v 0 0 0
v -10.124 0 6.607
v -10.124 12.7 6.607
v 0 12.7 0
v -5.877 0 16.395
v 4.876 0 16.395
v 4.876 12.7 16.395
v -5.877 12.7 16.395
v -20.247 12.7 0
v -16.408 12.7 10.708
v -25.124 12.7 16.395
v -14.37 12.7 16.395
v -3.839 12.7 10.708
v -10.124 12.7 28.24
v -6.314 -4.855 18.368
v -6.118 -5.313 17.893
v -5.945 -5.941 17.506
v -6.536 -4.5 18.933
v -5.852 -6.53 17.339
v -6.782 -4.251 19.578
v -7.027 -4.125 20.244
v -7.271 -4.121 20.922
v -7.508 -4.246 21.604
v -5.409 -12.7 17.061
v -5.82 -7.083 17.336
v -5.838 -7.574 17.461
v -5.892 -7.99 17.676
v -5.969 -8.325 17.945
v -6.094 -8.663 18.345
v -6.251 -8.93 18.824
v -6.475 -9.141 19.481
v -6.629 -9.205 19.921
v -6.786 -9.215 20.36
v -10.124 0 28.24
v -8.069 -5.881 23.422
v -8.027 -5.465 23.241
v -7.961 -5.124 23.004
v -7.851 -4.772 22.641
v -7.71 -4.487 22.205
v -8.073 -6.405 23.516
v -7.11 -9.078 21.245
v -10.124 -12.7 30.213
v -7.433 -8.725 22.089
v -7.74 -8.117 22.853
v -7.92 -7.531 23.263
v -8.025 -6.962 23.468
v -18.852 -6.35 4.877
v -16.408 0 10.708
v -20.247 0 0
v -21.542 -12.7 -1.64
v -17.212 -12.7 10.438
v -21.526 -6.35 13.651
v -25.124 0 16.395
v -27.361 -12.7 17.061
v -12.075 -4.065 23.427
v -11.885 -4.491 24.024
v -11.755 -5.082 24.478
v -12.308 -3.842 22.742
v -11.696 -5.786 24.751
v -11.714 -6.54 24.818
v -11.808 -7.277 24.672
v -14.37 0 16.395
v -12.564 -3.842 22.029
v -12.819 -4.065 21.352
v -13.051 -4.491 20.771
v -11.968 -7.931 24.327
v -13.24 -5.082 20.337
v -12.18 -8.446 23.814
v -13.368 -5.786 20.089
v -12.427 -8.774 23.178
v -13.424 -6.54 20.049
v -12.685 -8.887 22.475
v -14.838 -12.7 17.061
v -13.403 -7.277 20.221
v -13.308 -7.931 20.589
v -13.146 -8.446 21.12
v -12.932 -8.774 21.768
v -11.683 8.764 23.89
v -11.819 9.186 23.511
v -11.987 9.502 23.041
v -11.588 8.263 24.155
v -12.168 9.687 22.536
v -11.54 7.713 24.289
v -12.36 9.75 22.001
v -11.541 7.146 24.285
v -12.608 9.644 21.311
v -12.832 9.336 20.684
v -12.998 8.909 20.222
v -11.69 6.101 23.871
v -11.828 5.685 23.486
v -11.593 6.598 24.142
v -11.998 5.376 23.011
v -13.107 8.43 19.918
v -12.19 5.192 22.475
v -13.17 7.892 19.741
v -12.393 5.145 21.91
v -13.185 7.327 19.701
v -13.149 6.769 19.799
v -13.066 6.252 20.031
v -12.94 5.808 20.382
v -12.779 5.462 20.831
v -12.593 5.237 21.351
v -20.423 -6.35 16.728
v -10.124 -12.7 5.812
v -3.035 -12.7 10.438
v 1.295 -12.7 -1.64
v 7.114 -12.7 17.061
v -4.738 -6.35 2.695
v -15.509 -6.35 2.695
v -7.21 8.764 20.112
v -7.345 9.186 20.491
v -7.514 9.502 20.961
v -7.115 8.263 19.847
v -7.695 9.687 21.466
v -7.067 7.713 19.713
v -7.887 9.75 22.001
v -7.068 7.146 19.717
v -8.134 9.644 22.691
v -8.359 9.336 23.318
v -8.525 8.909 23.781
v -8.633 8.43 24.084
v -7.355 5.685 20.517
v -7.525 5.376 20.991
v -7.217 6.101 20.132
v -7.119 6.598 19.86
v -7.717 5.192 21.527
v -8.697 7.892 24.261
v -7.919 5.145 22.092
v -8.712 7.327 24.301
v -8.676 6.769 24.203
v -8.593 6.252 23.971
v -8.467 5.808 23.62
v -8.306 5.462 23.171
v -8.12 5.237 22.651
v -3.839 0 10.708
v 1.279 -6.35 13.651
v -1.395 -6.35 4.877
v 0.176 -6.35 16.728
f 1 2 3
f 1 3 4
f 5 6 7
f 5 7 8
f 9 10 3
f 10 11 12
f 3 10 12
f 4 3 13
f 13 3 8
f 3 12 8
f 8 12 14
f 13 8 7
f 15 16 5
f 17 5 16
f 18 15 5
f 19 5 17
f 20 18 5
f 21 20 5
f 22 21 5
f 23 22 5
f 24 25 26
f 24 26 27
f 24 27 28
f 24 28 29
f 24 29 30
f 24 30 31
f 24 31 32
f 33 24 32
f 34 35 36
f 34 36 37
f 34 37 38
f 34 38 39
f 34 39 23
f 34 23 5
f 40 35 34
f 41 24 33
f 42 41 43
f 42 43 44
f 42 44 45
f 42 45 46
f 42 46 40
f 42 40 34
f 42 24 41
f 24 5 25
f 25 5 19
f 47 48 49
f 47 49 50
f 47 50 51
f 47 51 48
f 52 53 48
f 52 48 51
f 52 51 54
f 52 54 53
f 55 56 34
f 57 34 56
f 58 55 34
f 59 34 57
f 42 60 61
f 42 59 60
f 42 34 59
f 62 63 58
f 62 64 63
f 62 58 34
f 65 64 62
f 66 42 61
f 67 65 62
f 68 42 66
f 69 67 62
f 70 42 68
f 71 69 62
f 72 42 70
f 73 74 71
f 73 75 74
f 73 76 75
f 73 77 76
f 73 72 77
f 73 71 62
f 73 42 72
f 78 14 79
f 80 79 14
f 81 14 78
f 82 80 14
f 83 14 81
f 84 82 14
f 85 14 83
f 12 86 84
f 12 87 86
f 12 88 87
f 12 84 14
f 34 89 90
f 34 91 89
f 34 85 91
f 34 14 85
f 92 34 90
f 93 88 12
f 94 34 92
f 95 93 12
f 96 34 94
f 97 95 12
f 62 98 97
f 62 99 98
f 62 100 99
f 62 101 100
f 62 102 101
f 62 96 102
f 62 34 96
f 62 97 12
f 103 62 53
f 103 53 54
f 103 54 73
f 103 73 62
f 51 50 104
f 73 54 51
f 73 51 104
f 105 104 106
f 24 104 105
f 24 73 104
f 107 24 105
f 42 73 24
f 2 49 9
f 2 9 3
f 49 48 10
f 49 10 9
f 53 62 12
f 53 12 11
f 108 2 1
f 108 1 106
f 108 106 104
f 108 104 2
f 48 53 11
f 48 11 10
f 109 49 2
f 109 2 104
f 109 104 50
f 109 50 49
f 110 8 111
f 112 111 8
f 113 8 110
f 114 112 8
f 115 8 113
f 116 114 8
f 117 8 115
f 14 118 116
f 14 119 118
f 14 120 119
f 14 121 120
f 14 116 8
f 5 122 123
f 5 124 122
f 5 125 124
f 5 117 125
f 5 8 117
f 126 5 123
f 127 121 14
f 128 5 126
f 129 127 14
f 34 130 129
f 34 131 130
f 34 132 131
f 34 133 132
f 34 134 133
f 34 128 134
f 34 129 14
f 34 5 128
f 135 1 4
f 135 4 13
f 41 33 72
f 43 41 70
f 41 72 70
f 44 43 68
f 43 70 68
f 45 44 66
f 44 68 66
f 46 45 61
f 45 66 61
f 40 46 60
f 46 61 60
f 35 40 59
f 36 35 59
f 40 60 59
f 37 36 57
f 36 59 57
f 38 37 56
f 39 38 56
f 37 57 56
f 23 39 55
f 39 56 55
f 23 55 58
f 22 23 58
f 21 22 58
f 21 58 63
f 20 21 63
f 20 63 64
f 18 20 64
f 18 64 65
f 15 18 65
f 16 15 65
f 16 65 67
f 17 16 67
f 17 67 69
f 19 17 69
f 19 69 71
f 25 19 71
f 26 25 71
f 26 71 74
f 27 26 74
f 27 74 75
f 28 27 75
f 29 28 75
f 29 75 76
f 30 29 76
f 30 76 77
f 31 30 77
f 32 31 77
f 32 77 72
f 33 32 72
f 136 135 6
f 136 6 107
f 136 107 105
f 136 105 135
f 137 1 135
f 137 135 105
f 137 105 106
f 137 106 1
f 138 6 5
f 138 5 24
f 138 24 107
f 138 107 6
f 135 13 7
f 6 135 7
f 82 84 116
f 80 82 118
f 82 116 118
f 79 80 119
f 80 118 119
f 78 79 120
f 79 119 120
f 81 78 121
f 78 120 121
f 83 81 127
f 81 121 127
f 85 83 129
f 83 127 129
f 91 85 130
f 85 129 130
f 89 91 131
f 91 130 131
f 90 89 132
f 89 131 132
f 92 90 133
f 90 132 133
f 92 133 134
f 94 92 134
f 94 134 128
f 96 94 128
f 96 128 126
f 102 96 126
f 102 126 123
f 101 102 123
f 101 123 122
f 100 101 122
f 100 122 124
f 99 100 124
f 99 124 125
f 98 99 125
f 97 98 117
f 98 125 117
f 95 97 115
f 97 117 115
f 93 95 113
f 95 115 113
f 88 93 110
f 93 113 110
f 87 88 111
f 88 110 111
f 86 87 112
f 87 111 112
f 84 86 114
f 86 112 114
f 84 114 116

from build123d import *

# Parameters (mm, degrees)
F2_DEPTH      = 12.7
F2_TAPER      = -3
F2_DEPTH_BACK = 12.7
F3_R          = 2.54
F4_DEPTH      = 8.0921539509
F5_R          = 2.3034089063
F6_DEPTH      = 27.362293552


with BuildPart() as f2:
    # F1 (on Front) → F2 (new body, two sides)
    with BuildSketch(Plane.XZ) as f2_sk:
        Polygon((-16.4084644725, 10.7080111944), (-20.2470514737, 0), (-10.1235257369, 6.606518672), align=None)
        Polygon((-25.1235257369, 16.3953790609), (-16.4084644725, 10.7080111944), (-14.3696679147, 16.3953790609), align=None)
        Polygon((-14.3696679147, 16.3953790609), (-16.4084644725, 10.7080111944), (-10.1235257369, 6.606518672), (-3.8385870012, 10.7080111944), (-5.877383559, 16.3953790609), align=None)
        Polygon((-3.8385870012, 10.7080111944), (-10.1235257369, 6.606518672), (0, 0), align=None)
        Polygon((-10.1235257369, 28.2402943798), (-14.3696679147, 16.3953790609), (-5.877383559, 16.3953790609), align=None)
        Polygon((-5.877383559, 16.3953790609), (-3.8385870012, 10.7080111944), (4.8764742631, 16.3953790609), align=None)
    extrude(amount=F2_DEPTH, taper=F2_TAPER)
    extrude(f2_sk.sketch, amount=-F2_DEPTH_BACK)

    # F3 (on face) → F4 (cut, through all)
    with BuildSketch(Plane(origin=(-17.892314741, 0.9961261053, 6.4140021466), x_dir=(-0.0492660937, -0.9986295348, 0.0176608133), z_dir=(-0.9400530679, 0.0523359562, 0.3369883932))):
        with Locations((7.3562075321, 16.8761180249)):
            Circle(F3_R)
    extrude(amount=-F4_DEPTH, mode=Mode.SUBTRACT)

    # F5 (on Right) → F6 (cut, through all)
    with BuildSketch(Plane.YZ):
        with Locations((7.44647393, 22.0010466874)):
            Circle(F5_R)
    extrude(amount=-F6_DEPTH, mode=Mode.SUBTRACT)


solid = f2.part
